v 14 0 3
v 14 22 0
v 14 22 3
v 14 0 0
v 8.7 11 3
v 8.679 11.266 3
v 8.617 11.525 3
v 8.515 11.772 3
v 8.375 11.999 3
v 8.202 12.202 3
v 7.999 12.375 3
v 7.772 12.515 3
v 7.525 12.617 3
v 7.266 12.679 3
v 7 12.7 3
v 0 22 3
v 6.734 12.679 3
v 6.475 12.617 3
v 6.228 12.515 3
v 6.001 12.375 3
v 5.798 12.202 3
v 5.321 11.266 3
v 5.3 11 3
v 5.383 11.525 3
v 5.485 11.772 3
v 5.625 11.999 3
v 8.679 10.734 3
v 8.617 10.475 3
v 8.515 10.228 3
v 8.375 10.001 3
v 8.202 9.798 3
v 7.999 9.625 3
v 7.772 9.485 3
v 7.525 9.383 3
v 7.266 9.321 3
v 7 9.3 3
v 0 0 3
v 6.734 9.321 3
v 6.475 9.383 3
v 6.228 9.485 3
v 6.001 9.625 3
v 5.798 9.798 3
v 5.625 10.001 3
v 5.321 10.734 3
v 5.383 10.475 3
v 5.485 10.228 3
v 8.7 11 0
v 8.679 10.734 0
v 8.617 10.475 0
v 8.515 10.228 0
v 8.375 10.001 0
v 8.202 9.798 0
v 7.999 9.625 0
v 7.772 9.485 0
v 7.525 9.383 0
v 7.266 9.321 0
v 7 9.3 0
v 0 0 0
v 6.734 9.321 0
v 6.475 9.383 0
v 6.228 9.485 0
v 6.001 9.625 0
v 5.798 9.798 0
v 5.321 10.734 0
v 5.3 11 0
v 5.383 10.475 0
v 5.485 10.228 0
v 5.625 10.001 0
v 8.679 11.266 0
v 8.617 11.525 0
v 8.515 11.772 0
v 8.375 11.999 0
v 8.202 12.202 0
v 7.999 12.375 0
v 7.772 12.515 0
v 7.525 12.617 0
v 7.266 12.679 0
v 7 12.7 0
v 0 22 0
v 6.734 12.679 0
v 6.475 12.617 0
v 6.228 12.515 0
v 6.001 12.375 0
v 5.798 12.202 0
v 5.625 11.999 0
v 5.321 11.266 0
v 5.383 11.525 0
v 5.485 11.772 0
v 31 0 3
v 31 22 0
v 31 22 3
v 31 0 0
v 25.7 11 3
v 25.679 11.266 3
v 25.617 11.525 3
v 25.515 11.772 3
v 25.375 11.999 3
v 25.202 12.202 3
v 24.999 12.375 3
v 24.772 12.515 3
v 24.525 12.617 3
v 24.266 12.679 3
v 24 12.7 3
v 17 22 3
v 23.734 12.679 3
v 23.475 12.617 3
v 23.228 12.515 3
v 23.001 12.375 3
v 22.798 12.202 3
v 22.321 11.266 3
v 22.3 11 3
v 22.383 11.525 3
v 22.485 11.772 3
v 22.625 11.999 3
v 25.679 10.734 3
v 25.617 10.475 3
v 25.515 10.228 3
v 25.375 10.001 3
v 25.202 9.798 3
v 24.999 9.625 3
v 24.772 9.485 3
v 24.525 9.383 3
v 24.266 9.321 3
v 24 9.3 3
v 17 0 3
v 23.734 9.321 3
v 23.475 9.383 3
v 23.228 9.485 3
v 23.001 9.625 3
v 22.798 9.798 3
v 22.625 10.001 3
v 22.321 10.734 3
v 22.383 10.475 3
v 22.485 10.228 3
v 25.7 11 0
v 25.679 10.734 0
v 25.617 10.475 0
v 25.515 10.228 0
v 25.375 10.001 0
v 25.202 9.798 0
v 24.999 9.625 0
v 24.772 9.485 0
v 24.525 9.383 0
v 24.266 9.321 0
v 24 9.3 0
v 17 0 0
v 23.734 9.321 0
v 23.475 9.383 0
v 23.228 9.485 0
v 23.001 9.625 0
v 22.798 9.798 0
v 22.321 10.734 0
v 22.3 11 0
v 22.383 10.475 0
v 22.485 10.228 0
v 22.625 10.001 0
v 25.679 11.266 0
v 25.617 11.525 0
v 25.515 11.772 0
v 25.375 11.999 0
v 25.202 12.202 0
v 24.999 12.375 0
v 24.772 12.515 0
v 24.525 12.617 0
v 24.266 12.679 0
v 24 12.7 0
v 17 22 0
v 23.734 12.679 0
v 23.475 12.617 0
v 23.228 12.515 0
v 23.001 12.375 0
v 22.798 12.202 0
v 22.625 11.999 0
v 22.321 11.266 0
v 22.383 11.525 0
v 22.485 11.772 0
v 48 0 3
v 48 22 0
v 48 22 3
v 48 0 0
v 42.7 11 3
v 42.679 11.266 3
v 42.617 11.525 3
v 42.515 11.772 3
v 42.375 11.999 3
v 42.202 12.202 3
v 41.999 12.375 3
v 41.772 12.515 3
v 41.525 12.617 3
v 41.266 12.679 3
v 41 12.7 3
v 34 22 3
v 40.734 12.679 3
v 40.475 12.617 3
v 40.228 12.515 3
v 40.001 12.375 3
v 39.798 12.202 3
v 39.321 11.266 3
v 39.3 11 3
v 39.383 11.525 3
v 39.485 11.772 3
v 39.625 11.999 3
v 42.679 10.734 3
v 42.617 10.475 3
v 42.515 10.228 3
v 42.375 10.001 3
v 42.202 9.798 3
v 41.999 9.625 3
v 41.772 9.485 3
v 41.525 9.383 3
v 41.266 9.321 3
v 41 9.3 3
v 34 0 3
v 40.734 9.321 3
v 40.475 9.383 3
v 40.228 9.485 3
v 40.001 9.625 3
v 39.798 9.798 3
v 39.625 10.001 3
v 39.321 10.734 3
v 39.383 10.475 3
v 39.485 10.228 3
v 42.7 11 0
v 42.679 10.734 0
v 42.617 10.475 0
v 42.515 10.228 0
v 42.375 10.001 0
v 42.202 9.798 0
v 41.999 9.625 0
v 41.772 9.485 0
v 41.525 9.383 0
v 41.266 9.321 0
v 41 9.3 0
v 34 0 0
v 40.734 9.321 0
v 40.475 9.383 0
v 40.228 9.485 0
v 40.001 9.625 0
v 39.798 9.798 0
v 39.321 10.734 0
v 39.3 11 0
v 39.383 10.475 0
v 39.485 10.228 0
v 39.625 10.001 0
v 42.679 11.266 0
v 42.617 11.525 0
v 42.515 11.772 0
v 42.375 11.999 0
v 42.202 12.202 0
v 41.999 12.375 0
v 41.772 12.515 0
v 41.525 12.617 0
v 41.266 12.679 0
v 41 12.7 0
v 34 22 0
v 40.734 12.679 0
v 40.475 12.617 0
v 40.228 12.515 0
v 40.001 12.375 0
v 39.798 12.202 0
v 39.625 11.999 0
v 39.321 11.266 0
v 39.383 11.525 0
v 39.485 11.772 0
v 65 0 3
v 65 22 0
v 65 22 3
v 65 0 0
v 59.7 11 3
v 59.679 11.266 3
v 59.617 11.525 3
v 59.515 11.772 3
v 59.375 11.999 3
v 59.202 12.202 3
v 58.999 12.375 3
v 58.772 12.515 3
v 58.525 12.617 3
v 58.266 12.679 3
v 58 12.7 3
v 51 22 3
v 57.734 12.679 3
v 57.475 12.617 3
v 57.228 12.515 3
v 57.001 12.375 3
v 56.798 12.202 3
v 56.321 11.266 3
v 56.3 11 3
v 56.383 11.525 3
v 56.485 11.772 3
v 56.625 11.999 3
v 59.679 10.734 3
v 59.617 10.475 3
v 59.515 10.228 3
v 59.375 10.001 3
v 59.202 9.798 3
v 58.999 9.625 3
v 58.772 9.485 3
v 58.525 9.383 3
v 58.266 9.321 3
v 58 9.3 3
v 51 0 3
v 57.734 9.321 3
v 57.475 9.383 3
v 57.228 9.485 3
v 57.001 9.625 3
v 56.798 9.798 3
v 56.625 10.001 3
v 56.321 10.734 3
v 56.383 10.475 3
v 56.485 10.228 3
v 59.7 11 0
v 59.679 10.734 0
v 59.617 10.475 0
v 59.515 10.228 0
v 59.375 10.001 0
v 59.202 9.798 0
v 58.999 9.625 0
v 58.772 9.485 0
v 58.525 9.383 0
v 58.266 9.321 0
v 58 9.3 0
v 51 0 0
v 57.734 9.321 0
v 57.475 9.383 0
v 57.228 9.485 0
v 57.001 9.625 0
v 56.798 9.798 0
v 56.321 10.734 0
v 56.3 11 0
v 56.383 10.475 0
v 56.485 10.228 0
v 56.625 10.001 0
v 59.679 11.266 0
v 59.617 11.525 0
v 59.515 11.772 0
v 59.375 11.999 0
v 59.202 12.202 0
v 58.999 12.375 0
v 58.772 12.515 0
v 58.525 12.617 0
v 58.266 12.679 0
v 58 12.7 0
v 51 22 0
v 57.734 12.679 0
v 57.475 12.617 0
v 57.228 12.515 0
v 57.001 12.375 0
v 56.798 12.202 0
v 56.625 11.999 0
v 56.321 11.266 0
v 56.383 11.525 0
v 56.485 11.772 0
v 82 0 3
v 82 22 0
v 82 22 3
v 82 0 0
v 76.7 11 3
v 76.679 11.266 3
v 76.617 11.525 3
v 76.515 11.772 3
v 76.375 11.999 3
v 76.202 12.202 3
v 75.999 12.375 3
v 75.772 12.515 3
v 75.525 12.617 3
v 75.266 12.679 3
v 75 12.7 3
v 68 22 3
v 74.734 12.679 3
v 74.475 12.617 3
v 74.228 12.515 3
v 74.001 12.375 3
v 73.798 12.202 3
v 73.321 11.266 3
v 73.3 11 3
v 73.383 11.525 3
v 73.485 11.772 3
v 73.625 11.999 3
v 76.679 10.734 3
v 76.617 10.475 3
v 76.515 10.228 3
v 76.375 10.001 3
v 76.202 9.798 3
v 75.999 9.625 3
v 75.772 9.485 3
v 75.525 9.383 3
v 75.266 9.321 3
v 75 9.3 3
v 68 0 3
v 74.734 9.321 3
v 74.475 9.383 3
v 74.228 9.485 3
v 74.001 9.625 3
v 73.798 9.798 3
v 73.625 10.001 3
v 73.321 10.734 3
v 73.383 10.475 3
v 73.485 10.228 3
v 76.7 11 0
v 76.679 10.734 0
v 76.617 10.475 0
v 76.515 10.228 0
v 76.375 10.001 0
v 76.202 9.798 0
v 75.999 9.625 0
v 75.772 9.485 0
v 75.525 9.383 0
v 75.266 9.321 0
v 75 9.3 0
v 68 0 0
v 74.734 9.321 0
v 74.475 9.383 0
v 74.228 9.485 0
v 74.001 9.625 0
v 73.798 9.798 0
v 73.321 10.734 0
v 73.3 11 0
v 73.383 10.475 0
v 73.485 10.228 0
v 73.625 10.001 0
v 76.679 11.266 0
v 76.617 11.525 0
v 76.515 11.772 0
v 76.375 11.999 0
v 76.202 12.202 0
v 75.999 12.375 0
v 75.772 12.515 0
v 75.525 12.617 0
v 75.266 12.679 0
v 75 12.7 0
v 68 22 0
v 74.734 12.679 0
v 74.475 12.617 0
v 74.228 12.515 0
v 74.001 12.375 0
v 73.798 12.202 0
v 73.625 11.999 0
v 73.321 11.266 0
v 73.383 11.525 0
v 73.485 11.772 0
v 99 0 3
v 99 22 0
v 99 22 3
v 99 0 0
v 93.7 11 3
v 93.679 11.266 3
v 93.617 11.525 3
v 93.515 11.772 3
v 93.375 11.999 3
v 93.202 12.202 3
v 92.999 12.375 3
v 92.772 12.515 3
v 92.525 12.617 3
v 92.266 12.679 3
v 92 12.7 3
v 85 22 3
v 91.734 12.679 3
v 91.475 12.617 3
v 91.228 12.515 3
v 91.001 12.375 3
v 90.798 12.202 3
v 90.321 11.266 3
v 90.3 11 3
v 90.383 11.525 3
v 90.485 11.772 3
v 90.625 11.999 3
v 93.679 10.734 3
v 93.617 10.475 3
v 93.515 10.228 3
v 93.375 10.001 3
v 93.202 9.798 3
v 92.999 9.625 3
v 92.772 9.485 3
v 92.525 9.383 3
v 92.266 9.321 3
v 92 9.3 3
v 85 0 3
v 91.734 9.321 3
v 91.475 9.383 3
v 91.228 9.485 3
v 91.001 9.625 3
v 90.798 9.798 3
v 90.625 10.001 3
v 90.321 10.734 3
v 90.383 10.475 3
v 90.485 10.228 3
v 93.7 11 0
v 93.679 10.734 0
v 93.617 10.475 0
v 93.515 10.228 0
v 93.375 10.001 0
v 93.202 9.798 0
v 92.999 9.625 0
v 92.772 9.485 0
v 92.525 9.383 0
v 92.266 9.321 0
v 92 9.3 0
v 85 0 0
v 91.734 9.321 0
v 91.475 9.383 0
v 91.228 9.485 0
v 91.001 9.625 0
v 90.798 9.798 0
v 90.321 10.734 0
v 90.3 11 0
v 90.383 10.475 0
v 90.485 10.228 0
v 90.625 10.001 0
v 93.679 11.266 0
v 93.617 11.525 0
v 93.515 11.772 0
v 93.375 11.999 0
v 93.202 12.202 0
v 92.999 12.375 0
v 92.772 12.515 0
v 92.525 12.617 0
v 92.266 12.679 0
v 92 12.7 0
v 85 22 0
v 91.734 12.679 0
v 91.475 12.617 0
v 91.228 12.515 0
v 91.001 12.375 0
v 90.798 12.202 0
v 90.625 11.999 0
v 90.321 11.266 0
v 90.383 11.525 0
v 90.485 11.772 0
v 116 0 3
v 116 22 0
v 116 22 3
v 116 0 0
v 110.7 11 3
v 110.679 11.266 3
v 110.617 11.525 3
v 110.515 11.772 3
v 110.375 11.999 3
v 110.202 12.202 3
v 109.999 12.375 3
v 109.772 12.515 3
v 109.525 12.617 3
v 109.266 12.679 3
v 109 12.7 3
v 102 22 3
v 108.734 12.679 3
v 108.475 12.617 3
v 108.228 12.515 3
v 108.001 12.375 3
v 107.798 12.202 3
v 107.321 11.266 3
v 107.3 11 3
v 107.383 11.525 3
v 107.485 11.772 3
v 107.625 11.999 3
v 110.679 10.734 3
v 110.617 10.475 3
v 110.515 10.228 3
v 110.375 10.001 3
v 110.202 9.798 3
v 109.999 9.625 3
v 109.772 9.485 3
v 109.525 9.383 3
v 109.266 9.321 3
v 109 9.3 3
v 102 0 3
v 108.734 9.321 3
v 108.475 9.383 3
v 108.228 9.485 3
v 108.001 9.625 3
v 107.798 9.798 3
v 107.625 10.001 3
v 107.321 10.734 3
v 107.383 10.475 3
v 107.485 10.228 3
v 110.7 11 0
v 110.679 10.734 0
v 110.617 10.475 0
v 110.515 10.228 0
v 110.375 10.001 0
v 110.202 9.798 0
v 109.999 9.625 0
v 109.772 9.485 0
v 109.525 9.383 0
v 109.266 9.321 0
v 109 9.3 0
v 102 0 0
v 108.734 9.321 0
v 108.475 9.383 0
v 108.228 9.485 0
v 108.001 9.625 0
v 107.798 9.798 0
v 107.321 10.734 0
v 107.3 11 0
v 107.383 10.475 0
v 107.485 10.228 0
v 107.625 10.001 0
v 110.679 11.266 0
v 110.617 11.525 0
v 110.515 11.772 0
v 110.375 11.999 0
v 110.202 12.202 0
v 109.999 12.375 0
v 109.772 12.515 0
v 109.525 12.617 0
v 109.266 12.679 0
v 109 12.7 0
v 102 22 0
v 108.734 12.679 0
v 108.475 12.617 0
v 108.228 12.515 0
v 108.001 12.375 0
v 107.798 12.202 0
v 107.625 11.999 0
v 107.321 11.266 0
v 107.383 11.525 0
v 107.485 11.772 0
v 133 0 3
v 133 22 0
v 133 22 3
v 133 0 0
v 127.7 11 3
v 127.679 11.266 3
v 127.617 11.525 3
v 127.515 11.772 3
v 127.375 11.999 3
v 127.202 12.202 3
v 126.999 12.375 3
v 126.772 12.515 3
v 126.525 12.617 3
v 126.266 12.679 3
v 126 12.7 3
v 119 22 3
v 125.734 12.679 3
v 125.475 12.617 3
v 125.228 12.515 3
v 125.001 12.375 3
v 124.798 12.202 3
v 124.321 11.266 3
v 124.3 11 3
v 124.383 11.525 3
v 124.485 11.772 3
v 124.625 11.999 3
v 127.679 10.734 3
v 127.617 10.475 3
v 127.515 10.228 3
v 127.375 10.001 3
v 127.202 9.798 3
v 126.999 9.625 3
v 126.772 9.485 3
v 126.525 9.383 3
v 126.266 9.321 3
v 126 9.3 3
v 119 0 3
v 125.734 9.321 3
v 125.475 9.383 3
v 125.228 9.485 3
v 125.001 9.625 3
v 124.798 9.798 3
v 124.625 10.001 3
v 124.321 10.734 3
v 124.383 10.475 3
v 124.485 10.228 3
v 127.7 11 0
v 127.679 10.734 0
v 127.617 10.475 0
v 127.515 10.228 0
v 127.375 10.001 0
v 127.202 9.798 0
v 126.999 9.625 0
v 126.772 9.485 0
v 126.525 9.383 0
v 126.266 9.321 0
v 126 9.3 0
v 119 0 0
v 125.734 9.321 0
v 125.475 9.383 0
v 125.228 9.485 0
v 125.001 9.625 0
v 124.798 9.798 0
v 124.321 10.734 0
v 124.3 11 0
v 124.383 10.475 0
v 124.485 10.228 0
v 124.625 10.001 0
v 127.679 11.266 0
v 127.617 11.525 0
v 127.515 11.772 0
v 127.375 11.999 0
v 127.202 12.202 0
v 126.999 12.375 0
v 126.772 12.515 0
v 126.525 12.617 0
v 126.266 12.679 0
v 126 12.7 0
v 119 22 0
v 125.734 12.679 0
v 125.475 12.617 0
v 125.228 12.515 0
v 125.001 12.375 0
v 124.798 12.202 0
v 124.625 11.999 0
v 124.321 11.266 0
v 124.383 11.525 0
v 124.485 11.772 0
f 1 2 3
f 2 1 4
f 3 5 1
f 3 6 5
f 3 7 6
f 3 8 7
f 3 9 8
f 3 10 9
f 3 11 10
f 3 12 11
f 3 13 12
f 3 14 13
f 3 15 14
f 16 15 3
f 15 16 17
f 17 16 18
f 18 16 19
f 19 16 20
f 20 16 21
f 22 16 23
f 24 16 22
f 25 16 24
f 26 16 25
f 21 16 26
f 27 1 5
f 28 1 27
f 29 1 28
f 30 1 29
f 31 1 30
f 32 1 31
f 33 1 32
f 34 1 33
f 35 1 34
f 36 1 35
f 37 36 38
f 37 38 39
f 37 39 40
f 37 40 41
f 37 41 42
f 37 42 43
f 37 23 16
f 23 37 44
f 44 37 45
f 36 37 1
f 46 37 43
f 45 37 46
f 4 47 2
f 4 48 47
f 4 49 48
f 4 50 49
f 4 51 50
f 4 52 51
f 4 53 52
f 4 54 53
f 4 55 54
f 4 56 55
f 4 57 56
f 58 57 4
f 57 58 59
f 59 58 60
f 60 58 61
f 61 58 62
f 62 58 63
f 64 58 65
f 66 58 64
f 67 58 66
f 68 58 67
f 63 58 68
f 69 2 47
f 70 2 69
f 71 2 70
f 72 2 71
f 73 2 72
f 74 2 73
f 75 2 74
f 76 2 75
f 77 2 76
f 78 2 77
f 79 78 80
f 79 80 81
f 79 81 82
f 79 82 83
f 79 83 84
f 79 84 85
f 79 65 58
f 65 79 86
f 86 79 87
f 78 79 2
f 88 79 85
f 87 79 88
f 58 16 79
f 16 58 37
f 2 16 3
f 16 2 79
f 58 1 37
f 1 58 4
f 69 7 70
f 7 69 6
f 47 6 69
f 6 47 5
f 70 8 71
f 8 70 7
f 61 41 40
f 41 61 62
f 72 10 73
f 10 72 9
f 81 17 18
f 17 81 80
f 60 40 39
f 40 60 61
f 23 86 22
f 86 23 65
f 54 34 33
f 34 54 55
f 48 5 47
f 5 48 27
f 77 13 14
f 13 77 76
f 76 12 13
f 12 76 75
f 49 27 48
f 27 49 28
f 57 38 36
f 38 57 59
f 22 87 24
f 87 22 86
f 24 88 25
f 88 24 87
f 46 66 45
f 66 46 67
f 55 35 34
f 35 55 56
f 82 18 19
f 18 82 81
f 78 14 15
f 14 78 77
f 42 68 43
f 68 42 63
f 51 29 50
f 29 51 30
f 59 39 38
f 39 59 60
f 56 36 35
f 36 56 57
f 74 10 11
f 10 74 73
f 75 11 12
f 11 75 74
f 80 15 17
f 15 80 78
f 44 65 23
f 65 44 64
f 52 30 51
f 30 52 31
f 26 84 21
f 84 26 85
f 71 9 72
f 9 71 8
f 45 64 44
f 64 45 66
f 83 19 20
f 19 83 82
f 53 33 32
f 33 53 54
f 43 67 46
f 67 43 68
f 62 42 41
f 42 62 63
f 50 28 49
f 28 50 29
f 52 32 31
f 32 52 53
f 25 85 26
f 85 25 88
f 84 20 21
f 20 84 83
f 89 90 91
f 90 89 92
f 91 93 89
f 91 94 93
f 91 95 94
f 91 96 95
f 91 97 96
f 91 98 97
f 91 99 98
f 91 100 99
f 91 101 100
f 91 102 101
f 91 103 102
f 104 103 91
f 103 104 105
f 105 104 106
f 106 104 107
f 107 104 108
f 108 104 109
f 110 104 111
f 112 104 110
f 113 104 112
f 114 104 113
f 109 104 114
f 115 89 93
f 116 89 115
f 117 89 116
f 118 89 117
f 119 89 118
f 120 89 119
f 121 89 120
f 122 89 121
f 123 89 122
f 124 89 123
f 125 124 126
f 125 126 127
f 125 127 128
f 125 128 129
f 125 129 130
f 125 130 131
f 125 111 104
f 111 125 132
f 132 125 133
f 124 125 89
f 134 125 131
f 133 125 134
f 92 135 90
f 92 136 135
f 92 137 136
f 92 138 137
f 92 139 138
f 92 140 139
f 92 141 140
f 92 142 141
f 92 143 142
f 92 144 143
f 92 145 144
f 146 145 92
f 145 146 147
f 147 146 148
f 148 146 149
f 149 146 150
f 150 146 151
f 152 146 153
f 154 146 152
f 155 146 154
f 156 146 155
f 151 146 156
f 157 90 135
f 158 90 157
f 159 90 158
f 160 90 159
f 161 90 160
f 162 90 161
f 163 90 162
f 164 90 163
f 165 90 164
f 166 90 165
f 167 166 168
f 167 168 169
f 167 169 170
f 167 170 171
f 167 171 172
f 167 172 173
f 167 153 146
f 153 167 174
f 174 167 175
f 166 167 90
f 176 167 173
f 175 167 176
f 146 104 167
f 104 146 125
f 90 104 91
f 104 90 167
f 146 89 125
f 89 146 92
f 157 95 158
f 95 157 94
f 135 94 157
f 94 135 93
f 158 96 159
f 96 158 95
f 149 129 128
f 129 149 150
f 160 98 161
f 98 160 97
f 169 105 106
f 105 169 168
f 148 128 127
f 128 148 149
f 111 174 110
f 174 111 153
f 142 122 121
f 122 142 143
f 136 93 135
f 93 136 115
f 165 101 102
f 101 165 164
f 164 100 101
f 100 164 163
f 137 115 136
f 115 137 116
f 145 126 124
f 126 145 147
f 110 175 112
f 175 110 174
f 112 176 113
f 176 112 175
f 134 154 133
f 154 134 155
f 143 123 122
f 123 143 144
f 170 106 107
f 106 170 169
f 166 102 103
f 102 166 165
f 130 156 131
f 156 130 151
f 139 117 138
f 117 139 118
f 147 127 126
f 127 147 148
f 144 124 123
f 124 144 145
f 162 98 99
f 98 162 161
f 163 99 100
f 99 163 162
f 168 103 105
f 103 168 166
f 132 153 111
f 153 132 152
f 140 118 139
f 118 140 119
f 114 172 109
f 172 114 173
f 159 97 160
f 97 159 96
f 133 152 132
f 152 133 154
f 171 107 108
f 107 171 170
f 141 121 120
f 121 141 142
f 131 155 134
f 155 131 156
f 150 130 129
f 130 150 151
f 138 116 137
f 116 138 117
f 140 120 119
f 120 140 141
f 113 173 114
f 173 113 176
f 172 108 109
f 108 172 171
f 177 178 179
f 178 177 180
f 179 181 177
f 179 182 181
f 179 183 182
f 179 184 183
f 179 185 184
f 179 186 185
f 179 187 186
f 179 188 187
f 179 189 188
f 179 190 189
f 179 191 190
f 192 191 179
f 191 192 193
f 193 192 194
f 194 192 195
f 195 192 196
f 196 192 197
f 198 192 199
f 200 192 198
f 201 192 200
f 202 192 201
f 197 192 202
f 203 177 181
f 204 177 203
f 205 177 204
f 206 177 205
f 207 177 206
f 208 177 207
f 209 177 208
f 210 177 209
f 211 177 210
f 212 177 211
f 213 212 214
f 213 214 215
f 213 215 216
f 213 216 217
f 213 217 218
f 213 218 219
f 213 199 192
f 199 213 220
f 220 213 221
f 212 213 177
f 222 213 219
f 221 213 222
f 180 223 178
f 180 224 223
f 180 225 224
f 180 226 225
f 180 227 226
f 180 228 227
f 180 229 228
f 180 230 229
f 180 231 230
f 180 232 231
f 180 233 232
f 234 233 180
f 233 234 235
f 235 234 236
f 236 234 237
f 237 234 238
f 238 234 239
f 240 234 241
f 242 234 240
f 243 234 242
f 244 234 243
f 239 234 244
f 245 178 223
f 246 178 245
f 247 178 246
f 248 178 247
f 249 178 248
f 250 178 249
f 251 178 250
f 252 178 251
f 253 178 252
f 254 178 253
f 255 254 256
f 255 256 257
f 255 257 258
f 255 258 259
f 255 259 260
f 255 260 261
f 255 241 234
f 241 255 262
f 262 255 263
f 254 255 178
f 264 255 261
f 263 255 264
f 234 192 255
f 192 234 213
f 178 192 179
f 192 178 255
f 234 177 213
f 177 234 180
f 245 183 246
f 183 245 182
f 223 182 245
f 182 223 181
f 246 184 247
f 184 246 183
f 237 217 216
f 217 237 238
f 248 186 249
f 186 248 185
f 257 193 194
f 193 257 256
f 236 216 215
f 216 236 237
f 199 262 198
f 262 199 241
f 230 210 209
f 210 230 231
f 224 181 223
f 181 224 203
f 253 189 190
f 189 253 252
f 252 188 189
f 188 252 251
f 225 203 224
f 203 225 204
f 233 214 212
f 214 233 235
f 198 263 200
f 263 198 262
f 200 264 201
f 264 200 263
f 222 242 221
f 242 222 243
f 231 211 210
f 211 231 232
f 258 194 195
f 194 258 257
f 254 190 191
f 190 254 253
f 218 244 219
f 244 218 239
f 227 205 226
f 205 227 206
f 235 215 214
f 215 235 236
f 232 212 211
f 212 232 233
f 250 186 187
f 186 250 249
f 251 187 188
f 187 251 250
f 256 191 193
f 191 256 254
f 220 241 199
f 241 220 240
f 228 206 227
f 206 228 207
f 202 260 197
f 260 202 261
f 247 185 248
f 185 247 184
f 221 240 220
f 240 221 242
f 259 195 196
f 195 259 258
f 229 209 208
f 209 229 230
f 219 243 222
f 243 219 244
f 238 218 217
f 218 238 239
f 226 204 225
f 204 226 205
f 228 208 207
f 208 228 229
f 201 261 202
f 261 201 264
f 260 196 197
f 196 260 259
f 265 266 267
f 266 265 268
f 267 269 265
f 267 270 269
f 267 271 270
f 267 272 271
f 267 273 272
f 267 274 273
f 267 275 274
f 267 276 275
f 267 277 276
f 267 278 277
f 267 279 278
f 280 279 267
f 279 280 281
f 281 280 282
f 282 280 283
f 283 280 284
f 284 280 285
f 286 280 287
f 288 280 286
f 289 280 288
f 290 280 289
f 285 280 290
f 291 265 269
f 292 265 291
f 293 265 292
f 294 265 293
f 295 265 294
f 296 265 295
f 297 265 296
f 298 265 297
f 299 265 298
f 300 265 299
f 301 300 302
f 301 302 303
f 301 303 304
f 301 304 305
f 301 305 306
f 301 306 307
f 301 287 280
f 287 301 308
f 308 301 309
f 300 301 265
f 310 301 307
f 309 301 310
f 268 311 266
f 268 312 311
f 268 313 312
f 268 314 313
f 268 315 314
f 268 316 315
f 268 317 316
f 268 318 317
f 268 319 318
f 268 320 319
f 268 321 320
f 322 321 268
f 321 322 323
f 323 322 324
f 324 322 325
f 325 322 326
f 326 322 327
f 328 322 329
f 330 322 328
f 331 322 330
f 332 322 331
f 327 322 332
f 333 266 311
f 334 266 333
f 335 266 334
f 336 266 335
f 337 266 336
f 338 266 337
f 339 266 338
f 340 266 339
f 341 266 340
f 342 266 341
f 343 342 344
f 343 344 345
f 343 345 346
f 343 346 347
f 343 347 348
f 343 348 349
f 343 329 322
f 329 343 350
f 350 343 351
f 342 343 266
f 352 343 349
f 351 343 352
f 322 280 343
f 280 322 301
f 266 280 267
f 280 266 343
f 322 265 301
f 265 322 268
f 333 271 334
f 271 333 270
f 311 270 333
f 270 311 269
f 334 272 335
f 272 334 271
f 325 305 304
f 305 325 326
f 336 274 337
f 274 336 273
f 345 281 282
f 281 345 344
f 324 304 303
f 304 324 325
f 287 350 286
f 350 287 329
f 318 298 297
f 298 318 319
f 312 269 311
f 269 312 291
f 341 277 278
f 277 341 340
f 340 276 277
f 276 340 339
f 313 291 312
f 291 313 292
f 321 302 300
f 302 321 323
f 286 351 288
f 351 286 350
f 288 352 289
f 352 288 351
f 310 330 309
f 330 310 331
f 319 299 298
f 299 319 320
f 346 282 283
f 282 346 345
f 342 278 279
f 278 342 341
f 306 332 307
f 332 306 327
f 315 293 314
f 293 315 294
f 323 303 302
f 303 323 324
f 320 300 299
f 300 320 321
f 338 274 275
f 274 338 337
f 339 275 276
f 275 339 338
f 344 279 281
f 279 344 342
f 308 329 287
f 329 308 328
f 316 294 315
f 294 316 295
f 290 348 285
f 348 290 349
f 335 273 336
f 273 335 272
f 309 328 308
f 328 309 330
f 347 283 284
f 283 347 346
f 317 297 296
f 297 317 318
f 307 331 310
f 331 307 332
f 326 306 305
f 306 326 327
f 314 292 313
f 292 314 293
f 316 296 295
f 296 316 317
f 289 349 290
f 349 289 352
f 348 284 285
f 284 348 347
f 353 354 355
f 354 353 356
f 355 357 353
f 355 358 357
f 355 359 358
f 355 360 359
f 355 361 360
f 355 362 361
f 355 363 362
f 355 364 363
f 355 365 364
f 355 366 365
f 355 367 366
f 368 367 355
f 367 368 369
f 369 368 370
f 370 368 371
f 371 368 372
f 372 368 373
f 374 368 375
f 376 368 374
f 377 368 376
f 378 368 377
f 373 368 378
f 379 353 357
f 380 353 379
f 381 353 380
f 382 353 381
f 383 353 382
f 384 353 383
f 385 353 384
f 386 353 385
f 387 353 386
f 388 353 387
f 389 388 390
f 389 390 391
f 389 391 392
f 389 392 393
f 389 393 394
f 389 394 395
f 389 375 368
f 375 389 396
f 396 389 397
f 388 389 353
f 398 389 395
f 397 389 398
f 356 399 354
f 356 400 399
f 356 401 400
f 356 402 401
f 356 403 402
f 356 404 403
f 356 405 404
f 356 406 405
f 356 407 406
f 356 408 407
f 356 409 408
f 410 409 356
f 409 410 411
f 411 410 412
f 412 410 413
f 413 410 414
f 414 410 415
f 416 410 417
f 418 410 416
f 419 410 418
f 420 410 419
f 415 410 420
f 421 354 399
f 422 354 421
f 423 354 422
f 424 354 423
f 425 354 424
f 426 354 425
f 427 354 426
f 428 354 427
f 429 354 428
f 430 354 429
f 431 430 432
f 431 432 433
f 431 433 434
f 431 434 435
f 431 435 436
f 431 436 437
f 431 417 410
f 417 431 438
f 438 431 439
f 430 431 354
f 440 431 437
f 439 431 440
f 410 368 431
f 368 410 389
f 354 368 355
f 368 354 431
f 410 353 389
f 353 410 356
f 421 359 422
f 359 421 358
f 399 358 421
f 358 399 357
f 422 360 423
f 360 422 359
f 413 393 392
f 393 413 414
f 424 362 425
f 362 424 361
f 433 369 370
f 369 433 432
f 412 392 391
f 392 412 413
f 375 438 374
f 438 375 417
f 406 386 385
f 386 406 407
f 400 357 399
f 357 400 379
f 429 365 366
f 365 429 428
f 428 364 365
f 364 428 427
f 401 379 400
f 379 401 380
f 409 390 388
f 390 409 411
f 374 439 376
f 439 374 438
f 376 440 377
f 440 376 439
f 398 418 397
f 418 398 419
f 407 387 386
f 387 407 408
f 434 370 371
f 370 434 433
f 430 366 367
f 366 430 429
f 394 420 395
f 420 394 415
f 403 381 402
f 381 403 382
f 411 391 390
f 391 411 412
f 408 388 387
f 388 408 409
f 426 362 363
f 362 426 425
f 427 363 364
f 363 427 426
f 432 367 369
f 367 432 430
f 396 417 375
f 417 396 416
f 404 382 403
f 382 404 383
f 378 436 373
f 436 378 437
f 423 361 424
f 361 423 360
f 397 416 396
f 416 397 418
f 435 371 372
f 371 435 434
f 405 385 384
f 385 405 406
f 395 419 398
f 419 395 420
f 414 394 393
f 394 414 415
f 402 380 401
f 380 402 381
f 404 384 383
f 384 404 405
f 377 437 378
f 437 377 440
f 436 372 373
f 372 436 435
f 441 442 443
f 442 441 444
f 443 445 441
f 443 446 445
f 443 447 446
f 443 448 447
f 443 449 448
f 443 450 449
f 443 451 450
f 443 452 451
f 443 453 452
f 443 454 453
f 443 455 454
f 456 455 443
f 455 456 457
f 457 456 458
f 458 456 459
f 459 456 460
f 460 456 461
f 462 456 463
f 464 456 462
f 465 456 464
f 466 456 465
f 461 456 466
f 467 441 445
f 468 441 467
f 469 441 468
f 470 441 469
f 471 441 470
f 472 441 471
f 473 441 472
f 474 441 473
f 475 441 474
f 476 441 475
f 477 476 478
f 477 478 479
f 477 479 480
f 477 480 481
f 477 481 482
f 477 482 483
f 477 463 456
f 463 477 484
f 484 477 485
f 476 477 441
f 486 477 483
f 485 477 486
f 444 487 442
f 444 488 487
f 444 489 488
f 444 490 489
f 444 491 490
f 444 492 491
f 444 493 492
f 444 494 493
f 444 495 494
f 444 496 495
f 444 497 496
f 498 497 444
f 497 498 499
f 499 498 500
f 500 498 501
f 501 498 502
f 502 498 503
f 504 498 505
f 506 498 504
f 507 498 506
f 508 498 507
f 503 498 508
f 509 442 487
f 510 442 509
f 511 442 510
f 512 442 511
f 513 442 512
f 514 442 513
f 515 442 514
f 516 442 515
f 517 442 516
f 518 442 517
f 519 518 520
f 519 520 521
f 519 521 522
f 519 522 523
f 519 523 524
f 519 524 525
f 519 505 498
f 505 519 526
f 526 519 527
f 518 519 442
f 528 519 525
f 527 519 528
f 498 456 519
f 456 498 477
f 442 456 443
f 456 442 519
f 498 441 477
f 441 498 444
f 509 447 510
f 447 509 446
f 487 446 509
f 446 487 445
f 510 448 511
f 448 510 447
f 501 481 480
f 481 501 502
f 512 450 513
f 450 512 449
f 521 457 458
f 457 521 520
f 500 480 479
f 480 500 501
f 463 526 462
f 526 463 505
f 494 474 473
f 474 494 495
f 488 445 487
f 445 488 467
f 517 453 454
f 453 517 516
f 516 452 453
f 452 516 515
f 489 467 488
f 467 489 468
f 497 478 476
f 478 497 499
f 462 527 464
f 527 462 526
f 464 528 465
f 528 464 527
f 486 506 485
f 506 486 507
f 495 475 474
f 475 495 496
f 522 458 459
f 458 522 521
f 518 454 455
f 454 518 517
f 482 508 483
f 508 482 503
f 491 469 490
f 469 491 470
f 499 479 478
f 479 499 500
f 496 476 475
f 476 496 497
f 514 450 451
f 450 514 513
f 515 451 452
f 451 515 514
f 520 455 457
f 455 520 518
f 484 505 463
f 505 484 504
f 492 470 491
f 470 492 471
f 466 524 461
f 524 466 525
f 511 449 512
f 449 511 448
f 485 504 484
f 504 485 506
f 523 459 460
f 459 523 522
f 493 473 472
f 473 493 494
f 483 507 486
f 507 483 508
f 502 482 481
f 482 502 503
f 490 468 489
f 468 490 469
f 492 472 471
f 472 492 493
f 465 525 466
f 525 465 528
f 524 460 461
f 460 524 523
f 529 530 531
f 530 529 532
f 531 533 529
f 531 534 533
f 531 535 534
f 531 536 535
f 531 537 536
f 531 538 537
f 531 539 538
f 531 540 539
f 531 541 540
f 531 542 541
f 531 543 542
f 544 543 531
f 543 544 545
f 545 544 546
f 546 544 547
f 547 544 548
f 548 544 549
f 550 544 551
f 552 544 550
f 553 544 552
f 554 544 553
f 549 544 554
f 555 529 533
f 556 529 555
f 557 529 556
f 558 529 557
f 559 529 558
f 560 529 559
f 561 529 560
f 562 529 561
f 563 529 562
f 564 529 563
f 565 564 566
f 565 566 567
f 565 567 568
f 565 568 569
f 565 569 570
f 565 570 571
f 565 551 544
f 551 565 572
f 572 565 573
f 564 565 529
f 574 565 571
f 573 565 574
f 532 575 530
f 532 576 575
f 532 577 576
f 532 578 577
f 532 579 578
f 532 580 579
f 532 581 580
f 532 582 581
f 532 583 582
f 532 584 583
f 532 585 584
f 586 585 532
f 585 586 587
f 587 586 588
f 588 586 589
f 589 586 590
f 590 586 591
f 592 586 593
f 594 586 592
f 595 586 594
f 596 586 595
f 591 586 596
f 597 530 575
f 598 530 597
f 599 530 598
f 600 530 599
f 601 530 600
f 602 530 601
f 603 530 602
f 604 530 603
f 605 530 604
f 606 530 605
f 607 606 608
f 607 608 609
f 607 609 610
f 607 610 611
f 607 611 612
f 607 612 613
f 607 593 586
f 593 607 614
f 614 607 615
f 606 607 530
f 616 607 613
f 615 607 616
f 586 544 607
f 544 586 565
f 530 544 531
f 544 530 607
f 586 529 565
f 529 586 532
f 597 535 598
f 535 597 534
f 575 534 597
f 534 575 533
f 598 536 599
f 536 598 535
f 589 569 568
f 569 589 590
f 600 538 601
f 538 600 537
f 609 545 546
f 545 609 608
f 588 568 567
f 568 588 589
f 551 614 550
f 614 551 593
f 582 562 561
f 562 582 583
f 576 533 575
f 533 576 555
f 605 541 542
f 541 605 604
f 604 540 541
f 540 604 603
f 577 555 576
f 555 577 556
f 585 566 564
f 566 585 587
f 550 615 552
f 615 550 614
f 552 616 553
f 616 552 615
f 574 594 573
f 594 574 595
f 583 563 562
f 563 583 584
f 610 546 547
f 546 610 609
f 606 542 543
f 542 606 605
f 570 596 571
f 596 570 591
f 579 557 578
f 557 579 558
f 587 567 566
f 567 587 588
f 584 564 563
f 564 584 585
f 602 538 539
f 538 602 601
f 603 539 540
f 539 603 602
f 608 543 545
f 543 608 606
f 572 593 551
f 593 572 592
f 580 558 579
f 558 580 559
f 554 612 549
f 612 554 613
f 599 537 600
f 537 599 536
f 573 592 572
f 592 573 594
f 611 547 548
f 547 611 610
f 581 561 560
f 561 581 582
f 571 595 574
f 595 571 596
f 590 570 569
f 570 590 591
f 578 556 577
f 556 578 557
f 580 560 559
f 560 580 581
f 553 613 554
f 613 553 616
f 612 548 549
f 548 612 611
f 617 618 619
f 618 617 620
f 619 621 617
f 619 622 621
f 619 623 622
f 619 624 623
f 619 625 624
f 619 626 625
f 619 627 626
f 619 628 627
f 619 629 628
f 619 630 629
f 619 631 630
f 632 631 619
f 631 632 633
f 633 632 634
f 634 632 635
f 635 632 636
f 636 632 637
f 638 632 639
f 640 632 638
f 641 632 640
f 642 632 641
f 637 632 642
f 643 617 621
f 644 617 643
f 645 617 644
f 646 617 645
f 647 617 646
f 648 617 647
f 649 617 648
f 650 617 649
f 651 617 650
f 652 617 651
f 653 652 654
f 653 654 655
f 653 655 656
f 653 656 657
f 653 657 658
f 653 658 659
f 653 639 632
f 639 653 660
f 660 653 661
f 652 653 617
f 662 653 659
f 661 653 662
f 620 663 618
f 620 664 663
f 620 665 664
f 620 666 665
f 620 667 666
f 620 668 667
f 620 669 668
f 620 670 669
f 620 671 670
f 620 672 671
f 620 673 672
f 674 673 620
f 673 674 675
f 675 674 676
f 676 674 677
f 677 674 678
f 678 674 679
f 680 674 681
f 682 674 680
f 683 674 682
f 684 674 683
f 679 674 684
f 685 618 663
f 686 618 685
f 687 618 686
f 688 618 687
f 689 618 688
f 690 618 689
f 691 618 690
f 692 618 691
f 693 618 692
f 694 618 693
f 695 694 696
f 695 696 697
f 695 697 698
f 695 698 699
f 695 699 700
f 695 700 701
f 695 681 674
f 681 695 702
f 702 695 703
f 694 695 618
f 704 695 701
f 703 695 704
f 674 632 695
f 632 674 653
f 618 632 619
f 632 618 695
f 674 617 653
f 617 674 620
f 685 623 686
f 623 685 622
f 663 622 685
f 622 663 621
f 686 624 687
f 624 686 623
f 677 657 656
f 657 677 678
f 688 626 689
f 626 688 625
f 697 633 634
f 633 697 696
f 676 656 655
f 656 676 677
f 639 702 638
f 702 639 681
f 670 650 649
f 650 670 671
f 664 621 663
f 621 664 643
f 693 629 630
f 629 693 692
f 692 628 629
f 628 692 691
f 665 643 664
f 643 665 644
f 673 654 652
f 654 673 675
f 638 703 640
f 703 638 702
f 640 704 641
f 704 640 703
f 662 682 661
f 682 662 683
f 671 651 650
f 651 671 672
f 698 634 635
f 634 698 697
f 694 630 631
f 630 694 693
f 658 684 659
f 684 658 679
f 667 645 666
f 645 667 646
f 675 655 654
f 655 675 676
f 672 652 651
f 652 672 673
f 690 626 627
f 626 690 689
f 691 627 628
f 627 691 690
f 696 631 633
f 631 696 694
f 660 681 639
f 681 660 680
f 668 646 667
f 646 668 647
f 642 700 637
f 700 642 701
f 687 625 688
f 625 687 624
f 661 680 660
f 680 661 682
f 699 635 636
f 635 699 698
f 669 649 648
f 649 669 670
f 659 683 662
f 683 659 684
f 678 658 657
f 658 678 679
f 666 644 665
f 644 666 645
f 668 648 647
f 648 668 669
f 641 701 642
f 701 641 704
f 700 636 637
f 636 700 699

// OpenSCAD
// Spacer for the lip bolts: goes under each M3x10 head inside the shelf lip, so the screw
// reaches 5 mm into the extrusion's T-nut instead of bottoming out in the slot.
// Its flat sides sit between the curl and the shelf, which stops it spinning while you start the screw.
t = 3; w = 14; h = 22; n = 8;
$fn = 40;
for (i = [0 : n - 1]) translate([i*(w + 3), 0, 0]) difference() {
  cube([w, h, t]);
  translate([w/2, h/2, -0.1]) cylinder(d = 3.4, h = t + 0.2);
}
